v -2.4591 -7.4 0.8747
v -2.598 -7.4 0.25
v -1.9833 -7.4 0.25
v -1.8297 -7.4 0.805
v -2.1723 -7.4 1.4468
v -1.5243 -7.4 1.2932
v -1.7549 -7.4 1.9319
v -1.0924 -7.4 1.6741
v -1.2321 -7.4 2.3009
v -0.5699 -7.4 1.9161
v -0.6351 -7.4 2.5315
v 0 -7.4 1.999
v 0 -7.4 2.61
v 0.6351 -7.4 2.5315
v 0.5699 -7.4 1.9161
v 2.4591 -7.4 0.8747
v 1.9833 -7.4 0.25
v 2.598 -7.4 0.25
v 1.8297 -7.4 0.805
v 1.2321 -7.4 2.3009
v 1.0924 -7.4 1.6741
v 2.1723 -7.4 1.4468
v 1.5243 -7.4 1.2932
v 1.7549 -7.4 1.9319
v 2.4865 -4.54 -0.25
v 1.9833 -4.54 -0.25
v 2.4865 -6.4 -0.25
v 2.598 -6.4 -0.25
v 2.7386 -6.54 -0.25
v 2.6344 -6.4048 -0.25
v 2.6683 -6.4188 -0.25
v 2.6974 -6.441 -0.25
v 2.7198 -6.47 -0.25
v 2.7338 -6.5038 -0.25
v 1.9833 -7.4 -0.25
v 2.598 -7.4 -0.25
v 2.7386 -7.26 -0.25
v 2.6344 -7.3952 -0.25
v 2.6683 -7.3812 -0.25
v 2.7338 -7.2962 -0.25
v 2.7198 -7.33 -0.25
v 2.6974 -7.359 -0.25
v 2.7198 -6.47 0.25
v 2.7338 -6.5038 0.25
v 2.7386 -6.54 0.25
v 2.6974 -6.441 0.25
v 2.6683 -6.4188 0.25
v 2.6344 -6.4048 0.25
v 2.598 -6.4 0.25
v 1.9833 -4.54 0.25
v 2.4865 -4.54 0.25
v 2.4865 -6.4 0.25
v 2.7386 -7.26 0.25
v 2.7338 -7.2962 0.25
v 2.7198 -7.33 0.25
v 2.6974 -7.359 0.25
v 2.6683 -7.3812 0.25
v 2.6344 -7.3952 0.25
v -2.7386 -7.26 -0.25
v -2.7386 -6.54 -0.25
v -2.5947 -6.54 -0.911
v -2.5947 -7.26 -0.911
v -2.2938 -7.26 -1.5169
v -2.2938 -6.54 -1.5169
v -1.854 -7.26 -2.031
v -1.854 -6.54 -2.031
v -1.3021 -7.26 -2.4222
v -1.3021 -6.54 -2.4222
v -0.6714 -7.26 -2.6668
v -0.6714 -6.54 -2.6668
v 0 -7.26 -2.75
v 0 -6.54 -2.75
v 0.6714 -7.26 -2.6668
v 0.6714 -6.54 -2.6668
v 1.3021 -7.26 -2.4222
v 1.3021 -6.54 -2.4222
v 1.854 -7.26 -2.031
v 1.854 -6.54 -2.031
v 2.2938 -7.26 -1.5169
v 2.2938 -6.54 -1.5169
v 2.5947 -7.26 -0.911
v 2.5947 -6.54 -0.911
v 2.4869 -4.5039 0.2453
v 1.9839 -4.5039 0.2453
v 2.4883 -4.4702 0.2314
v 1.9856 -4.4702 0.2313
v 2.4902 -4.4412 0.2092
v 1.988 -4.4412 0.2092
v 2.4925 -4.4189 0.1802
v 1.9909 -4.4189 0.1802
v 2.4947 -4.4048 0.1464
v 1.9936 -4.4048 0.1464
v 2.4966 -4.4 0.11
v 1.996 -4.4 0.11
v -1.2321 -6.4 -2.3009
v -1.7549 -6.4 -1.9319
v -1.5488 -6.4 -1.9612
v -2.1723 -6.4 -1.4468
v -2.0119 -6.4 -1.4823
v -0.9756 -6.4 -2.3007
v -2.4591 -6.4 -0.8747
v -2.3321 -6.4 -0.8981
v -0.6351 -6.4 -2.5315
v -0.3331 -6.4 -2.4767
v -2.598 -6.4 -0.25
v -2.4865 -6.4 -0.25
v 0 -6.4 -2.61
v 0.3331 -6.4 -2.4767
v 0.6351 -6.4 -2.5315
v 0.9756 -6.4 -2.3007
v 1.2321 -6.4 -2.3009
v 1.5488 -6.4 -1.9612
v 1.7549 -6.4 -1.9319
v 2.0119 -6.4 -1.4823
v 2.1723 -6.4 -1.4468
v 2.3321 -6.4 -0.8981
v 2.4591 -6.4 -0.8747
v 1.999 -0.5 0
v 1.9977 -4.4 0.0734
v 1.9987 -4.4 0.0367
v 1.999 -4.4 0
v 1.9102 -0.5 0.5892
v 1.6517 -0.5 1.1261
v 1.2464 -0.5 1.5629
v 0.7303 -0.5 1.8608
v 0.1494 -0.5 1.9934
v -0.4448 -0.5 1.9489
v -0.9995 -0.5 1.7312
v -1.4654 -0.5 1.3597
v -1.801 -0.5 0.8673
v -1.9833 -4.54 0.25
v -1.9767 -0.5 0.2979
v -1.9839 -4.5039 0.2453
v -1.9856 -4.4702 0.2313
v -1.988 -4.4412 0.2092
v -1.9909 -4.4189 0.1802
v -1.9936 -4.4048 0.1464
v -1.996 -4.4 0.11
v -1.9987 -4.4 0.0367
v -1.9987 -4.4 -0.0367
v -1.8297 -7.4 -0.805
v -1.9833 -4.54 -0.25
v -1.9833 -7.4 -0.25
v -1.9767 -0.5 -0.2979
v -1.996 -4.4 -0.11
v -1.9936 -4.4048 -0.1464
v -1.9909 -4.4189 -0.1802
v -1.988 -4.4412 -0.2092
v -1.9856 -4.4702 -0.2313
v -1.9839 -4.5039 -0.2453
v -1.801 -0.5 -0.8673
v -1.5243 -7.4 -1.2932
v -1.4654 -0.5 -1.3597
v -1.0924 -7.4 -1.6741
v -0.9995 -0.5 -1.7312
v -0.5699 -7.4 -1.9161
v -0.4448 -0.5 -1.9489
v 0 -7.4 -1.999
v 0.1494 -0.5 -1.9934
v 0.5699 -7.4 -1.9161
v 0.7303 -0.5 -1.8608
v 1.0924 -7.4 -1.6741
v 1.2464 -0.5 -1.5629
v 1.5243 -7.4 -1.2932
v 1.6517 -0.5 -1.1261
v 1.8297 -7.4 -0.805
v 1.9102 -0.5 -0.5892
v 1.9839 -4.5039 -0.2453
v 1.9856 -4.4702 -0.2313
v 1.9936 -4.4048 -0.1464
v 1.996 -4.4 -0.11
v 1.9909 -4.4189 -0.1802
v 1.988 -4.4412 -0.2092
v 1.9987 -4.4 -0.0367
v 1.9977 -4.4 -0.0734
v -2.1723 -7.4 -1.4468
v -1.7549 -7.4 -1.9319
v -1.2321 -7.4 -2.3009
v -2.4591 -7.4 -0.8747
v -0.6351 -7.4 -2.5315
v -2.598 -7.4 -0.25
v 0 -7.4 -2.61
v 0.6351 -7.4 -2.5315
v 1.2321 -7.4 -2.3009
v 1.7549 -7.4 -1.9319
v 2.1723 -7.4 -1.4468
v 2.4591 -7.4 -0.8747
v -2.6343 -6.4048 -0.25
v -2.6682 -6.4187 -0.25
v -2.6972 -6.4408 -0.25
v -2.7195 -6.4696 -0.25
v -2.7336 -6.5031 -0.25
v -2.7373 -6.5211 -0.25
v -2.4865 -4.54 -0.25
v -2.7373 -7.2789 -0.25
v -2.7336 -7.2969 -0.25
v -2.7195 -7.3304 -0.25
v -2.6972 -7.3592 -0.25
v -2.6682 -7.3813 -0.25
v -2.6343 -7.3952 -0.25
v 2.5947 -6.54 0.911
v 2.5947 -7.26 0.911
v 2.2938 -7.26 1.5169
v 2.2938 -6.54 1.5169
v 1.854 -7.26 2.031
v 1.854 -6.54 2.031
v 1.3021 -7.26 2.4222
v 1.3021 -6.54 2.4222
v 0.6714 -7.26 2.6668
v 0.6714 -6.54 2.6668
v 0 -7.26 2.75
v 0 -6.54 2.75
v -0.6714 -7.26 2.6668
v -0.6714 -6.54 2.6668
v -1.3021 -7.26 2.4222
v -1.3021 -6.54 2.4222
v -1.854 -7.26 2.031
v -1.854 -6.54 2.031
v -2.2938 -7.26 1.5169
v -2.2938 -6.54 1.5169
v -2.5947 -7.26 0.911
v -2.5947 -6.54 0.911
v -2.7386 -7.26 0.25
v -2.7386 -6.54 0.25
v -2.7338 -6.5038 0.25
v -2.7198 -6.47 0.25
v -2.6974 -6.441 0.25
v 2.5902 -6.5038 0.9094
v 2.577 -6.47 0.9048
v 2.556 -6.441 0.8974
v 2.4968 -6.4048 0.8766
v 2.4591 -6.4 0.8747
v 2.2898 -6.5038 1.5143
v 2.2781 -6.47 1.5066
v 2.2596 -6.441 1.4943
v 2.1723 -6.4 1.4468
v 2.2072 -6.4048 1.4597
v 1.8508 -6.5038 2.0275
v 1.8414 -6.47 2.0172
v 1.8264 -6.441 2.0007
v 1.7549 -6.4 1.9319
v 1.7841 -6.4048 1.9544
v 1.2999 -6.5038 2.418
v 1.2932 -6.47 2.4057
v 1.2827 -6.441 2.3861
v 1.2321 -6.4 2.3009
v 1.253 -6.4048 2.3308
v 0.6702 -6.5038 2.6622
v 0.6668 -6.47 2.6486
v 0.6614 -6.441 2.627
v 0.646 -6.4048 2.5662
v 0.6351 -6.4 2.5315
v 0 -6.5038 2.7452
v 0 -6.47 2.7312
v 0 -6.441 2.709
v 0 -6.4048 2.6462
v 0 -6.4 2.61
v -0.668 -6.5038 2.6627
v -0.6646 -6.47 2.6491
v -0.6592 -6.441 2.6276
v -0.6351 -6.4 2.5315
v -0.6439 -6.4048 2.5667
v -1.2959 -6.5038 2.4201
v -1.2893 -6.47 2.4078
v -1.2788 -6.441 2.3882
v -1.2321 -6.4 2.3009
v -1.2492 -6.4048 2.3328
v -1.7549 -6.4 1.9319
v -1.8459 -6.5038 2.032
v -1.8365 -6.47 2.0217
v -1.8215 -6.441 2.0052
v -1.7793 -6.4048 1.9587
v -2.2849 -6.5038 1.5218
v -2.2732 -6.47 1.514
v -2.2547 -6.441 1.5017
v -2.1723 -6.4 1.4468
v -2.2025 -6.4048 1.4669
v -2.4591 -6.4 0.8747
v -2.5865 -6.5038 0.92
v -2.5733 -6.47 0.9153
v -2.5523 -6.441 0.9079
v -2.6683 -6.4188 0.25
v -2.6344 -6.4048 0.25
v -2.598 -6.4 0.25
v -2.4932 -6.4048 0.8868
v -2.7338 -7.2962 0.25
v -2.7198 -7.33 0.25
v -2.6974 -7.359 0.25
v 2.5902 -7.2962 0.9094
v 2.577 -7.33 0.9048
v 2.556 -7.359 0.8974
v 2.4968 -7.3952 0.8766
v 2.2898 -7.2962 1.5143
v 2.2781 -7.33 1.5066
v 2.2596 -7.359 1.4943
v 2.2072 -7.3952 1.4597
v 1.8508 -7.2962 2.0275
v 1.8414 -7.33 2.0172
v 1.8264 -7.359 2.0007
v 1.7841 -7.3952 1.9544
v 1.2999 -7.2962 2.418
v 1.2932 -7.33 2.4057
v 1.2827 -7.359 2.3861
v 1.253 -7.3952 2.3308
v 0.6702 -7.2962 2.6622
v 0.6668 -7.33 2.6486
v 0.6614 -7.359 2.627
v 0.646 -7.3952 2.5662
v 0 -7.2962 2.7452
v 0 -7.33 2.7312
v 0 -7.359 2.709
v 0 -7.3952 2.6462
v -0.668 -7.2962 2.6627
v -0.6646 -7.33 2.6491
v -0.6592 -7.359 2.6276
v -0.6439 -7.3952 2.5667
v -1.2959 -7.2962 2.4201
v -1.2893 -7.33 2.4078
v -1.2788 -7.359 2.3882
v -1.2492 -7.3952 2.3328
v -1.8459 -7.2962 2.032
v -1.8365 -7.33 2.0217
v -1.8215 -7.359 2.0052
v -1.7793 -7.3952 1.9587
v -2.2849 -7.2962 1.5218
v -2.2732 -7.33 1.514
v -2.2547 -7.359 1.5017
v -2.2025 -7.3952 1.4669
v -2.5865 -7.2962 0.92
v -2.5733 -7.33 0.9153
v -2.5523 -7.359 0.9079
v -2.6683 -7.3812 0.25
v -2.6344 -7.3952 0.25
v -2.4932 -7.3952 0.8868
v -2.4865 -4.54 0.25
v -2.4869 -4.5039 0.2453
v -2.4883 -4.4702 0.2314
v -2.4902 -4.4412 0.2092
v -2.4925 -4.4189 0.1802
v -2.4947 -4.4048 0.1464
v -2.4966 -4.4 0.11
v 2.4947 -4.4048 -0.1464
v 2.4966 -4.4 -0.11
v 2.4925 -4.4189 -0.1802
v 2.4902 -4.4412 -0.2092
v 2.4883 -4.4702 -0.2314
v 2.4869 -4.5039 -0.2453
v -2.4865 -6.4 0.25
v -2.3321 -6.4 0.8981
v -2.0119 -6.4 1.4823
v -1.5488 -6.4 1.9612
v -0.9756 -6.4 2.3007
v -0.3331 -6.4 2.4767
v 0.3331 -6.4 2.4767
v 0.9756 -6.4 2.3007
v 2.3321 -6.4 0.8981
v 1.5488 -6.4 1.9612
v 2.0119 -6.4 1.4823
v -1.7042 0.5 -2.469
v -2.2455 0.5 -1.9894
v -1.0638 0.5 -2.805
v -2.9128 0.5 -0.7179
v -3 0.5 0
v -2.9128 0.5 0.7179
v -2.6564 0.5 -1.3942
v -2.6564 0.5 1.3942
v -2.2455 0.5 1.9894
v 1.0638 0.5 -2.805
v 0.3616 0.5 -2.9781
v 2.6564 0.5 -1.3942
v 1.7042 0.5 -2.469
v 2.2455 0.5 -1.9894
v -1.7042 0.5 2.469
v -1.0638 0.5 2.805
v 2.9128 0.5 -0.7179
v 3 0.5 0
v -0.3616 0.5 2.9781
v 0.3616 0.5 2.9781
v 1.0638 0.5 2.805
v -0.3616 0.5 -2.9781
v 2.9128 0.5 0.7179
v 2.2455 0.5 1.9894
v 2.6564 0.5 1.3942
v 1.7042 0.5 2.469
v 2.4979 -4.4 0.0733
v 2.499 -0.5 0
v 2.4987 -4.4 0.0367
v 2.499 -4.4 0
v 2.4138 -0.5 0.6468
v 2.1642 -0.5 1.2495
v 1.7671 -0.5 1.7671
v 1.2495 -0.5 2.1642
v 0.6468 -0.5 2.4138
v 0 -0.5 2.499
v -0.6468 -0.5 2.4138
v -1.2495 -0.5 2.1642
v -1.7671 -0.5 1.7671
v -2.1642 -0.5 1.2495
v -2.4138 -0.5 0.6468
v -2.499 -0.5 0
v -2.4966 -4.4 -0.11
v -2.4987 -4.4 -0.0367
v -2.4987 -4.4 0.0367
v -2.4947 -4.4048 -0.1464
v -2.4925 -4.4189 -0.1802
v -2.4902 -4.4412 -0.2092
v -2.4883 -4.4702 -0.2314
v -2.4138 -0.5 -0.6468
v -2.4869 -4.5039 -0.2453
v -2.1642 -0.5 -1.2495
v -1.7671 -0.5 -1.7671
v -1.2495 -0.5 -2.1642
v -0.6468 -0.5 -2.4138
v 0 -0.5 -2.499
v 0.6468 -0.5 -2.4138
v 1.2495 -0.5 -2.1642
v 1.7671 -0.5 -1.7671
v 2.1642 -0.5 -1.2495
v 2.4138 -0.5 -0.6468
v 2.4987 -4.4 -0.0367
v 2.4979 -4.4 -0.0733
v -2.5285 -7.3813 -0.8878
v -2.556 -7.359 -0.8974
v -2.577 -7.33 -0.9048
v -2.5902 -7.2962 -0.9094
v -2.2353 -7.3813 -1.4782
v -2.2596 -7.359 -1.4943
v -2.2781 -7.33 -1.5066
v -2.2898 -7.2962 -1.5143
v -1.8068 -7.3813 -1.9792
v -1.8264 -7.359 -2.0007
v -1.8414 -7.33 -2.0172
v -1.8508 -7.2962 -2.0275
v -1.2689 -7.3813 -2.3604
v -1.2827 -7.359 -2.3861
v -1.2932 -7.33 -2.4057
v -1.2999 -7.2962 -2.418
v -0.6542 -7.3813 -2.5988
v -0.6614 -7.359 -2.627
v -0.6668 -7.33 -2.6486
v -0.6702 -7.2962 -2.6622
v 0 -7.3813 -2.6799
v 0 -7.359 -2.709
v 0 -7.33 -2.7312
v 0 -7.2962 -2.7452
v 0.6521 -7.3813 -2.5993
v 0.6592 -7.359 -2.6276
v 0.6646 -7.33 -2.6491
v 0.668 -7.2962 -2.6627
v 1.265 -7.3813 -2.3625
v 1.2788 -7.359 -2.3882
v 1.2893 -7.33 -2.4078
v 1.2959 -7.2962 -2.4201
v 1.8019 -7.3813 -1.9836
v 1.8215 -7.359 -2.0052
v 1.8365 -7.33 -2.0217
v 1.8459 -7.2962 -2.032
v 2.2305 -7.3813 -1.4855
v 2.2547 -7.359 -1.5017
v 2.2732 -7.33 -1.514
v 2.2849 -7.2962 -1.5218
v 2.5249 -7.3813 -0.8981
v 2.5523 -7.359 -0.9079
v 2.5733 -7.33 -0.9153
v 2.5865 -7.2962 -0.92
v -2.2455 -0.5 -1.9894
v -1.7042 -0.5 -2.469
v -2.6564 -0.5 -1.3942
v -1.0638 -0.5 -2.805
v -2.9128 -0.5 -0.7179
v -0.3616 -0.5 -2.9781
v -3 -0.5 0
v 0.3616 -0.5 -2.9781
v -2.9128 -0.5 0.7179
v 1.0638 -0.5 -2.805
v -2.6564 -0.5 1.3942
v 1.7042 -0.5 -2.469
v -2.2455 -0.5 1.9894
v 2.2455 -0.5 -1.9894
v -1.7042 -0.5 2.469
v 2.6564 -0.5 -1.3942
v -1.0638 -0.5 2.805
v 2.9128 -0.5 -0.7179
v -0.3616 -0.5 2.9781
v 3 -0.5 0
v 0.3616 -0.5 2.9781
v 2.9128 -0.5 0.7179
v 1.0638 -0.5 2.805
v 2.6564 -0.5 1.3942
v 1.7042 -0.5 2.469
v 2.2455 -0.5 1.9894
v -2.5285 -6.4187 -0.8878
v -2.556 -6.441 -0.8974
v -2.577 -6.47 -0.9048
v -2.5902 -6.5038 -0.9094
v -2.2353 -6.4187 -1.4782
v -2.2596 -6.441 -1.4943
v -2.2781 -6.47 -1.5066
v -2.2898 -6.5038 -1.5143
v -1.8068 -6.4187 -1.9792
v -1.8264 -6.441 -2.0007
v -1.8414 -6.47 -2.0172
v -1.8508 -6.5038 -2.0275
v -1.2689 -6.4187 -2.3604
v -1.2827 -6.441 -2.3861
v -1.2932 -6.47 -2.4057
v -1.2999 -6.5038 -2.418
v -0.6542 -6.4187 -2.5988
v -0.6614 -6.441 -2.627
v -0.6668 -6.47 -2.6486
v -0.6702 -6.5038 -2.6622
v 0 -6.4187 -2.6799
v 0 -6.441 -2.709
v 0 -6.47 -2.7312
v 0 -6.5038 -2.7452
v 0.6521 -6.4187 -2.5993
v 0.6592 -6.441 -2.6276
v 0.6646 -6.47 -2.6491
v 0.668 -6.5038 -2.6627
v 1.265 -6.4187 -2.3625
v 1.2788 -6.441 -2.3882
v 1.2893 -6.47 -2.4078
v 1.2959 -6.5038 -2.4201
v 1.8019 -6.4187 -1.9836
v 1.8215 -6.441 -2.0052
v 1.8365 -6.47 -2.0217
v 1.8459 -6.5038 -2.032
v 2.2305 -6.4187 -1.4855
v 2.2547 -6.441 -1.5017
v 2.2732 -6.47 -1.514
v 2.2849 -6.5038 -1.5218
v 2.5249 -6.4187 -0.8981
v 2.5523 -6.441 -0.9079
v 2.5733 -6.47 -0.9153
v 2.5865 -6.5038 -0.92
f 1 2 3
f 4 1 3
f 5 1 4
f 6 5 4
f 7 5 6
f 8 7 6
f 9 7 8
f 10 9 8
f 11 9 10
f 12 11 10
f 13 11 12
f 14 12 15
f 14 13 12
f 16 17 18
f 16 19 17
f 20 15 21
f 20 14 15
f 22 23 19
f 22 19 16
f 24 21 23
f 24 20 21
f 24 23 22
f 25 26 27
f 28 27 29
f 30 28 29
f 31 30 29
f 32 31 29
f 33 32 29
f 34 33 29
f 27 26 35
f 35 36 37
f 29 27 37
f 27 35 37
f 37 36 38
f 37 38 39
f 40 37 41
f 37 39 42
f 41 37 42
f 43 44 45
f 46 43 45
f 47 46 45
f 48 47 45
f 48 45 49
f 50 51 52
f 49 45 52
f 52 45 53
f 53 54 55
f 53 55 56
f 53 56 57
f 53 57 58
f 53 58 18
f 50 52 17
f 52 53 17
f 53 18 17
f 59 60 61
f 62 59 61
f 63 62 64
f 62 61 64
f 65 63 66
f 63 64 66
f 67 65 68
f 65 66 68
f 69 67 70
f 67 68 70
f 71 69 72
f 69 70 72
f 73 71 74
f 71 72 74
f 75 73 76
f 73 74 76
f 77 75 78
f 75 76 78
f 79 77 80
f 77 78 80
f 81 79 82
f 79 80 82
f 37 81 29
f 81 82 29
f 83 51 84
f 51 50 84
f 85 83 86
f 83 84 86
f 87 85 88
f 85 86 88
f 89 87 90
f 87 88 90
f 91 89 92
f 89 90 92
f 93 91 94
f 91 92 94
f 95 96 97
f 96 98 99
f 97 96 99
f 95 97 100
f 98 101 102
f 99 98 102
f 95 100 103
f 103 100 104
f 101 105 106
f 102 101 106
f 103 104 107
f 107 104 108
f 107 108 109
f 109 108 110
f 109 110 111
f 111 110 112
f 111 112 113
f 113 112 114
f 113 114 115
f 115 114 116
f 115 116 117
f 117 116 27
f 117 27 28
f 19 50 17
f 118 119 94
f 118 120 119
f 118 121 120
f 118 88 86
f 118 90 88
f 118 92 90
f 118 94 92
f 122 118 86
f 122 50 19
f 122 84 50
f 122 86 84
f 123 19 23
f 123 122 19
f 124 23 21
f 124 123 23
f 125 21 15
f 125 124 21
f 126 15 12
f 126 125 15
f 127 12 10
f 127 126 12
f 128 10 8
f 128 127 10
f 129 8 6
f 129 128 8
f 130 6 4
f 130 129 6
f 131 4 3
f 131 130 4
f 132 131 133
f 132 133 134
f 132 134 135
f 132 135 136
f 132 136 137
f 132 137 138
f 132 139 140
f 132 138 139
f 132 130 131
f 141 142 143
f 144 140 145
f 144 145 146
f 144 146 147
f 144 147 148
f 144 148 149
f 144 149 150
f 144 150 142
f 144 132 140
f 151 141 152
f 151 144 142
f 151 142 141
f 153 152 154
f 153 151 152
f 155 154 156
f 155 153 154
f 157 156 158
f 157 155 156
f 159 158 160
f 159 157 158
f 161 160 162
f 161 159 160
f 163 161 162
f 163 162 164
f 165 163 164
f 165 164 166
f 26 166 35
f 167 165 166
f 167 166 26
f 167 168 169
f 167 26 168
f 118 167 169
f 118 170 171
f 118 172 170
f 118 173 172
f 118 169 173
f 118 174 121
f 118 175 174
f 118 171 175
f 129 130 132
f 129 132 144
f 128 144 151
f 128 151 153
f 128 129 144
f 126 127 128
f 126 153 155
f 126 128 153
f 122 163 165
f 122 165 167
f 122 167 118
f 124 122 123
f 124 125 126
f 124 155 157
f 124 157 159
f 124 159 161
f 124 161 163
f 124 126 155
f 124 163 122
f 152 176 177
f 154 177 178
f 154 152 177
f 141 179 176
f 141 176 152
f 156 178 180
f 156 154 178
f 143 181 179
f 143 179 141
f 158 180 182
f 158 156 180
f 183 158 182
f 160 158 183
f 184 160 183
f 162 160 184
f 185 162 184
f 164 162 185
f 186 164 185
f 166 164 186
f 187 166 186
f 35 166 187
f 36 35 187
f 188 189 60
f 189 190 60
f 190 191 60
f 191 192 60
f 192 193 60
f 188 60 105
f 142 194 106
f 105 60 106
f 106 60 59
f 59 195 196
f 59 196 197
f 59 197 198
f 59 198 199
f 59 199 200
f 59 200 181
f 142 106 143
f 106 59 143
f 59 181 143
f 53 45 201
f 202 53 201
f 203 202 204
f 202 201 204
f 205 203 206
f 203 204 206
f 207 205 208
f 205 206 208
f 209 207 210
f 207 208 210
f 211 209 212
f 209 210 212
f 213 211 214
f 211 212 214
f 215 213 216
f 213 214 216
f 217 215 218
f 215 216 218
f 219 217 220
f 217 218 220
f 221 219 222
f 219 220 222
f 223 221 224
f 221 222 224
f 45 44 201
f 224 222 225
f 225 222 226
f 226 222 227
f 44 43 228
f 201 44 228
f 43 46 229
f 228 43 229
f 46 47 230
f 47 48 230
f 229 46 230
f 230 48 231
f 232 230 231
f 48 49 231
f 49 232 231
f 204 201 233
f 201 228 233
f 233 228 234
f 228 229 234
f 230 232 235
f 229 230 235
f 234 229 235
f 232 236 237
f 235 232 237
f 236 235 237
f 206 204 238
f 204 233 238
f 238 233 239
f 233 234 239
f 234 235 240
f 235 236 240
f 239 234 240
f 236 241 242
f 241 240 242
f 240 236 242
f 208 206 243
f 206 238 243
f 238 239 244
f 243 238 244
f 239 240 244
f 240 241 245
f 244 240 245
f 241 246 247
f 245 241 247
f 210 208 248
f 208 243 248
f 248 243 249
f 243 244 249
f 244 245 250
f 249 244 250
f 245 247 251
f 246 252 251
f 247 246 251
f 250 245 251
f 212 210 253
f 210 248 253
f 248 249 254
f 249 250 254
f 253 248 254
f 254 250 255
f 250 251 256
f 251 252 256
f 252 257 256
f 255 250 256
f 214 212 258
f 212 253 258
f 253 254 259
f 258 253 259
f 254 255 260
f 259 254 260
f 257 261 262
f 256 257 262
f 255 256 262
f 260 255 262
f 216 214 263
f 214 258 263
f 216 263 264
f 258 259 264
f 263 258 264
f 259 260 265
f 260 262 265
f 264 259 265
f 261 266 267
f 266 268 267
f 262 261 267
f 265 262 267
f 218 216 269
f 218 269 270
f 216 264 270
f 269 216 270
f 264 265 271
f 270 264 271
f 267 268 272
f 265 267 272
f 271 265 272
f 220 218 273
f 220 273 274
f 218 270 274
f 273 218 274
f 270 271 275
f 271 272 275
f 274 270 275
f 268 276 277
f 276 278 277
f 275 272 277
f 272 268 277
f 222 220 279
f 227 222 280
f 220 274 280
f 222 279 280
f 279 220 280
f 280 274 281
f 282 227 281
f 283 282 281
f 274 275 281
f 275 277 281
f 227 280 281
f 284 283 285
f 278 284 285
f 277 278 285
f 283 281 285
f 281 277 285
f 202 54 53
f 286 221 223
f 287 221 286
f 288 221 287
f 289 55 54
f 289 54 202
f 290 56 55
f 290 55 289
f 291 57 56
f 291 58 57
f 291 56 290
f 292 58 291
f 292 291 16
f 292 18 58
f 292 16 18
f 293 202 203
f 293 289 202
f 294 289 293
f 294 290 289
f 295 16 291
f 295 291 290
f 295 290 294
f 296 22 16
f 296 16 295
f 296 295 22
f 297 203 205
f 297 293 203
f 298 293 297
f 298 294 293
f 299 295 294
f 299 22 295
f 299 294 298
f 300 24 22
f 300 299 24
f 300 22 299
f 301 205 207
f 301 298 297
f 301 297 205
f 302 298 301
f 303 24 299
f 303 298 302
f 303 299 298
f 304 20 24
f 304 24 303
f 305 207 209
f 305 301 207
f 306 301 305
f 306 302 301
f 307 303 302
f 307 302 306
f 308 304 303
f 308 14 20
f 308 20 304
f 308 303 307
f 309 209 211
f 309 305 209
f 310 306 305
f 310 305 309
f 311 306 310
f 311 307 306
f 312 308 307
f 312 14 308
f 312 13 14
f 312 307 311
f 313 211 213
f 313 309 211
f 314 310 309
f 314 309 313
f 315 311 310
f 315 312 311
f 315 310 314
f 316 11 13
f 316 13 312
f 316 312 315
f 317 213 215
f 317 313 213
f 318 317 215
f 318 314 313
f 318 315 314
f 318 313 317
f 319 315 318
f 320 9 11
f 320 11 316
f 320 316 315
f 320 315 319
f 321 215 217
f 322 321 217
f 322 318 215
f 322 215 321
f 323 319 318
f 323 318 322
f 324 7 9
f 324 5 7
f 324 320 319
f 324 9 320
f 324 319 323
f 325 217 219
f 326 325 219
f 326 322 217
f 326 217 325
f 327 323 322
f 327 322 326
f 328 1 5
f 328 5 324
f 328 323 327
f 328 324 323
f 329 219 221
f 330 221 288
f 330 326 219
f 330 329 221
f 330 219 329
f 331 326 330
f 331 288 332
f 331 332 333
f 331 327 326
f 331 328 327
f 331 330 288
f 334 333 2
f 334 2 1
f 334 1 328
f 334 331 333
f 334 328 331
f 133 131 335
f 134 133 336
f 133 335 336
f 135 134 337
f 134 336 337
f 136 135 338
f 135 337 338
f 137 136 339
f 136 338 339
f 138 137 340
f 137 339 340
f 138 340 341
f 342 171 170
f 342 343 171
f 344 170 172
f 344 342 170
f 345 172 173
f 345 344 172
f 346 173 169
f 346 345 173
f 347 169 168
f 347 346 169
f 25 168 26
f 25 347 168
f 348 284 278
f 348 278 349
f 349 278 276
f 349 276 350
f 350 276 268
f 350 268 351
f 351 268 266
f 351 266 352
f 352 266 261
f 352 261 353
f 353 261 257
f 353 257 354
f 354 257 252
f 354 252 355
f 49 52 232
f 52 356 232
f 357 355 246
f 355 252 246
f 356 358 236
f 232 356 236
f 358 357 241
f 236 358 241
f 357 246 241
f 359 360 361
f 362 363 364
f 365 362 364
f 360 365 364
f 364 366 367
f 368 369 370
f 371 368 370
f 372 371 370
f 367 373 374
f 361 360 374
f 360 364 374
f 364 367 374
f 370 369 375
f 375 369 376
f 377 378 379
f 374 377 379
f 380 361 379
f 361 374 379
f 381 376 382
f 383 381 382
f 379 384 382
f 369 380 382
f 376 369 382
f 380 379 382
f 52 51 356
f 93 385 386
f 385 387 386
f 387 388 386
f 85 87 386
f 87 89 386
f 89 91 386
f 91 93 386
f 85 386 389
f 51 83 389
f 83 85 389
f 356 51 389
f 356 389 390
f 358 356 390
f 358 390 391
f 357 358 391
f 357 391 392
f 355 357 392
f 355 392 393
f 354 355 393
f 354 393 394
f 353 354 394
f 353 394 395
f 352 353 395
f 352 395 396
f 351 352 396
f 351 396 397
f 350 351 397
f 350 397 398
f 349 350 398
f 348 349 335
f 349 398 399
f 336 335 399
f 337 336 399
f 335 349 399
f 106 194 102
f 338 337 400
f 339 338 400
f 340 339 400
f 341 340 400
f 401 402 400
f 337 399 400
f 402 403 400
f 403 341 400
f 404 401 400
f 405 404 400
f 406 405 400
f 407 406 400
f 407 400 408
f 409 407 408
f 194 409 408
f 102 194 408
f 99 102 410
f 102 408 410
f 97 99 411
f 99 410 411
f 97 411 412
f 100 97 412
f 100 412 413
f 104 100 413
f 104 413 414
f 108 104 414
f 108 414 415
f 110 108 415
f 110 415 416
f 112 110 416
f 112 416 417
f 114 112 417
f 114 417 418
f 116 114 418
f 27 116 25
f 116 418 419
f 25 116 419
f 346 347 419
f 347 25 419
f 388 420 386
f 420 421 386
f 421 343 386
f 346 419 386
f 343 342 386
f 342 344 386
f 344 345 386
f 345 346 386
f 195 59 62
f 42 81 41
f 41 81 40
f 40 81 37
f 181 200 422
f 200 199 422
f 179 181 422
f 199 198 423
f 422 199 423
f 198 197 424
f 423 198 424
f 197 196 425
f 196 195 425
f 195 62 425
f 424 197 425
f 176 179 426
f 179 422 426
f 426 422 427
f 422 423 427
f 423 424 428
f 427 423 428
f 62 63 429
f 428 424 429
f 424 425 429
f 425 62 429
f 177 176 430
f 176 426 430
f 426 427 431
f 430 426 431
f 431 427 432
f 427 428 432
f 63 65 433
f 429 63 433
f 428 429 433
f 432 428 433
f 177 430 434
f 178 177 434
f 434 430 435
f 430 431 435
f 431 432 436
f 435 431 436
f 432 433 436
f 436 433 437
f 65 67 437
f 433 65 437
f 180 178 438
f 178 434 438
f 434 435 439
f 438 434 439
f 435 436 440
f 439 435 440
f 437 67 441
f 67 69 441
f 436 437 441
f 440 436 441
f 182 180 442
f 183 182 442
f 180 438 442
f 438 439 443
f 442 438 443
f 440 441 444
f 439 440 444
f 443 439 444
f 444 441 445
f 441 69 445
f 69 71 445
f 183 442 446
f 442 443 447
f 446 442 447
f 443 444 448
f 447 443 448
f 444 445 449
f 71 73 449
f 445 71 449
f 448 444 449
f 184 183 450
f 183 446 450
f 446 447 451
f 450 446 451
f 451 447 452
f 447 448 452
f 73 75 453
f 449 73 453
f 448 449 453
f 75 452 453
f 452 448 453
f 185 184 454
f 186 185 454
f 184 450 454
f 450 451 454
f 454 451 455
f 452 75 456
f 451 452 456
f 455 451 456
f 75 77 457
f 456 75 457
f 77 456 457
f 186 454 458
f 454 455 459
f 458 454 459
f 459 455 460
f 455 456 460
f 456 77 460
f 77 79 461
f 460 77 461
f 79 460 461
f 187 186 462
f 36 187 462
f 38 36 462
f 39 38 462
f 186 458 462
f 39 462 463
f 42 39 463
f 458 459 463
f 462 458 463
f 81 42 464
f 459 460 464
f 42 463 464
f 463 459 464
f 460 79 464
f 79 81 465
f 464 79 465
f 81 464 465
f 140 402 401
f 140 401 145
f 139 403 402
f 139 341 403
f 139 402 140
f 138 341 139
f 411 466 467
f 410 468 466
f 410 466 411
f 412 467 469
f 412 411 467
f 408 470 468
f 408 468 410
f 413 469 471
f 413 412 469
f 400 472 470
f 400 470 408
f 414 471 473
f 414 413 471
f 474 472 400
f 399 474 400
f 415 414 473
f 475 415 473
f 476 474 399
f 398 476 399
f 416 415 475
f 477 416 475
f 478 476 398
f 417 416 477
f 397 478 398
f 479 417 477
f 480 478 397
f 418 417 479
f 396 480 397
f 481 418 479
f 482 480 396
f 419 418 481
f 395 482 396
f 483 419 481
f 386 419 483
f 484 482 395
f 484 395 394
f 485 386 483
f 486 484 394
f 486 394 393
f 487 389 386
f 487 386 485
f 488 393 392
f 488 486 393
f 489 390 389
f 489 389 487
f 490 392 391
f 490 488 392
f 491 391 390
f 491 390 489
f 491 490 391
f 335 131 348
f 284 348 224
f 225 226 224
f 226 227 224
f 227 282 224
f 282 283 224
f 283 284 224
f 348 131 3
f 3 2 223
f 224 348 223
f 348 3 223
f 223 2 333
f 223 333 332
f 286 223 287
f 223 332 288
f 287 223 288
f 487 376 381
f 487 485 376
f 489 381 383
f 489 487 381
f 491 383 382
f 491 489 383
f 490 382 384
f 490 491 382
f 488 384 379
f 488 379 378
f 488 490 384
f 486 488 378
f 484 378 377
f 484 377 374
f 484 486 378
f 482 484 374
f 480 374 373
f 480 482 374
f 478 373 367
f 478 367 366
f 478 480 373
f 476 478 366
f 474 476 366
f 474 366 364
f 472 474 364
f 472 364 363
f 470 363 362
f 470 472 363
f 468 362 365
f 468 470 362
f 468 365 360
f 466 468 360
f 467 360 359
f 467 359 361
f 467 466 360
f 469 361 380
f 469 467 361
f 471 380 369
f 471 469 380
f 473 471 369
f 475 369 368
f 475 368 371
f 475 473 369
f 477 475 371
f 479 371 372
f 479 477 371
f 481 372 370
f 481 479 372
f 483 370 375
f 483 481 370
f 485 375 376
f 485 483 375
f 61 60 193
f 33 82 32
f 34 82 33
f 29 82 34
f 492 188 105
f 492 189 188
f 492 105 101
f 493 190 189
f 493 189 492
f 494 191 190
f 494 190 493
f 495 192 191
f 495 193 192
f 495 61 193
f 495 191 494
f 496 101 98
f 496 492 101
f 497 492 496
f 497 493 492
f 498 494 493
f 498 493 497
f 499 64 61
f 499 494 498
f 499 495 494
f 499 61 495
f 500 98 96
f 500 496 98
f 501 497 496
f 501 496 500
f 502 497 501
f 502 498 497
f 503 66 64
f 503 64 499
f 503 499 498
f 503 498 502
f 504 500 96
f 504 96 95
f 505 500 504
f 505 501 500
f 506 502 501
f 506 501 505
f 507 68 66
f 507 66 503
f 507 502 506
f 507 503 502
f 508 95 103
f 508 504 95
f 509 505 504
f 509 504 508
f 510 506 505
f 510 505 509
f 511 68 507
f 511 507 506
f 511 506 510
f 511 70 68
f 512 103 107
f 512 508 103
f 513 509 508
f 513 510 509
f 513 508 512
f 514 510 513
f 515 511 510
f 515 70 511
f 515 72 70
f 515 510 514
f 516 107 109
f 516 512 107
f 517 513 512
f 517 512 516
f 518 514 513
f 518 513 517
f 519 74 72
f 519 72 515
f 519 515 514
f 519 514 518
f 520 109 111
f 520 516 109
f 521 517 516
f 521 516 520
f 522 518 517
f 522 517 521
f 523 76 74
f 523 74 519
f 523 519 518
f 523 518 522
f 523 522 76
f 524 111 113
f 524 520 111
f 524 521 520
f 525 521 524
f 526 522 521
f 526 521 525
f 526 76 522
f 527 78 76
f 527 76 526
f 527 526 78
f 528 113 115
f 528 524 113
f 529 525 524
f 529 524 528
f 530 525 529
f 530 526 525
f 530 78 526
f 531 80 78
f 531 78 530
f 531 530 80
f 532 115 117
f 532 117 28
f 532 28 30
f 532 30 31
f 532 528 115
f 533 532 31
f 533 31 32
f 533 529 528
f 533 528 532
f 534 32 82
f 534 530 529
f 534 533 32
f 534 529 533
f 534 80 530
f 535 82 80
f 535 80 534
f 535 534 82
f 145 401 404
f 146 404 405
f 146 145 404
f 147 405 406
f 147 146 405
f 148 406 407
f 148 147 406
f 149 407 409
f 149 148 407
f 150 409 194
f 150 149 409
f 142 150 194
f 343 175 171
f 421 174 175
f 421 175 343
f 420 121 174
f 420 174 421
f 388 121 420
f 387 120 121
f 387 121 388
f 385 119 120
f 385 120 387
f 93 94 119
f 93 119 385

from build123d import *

# Parameters (mm, degrees)
F0_R     = 3
F1_DEPTH = 0.5
F2_R     = 2.499
F2_R_2   = 1.999
F3_DEPTH = 5.9
F4_R     = 2.75
F4_R_2   = 1.999
F5_DEPTH = 1
F7_DEPTH = 3
F8_R     = 0.14


with BuildPart() as f1:
    # F0 (on Front) → F1 (new body, symmetric)
    with BuildSketch(Plane.XZ):
        Circle(F0_R)
    extrude(amount=F1_DEPTH, both=True)

    # F2 (on face) → F3 (join)
    with BuildSketch(Plane.XZ.offset(0.5)):
        Circle(F2_R)
        Circle(F2_R_2, mode=Mode.SUBTRACT)
    extrude(amount=F3_DEPTH)

    # F4 (on face) → F5 (join)
    with BuildSketch(Plane.XZ.offset(6.4)):
        Circle(F4_R)
        Circle(F4_R_2, mode=Mode.SUBTRACT)
    extrude(amount=F5_DEPTH)

    # F6 (on face) → F7 (cut)
    with BuildSketch(Plane.XZ.offset(7.4)):
        with BuildLine():
            ThreePointArc((2.7386127875, -0.25), (2.75, 0), (2.7386127875, 0.25))
            Line((2.7386127875, 0.25), (1.983305574, 0.25))
            ThreePointArc((1.983305574, 0.25), (1.999, 0), (1.983305574, -0.25))
            Line((1.983305574, -0.25), (2.7386127875, -0.25))
        make_face()
        with BuildLine():
            Line((-2.7386127875, -0.25), (-1.983305574, -0.25))
            ThreePointArc((-1.983305574, -0.25), (-1.999, 0), (-1.983305574, 0.25))
            Line((-1.983305574, 0.25), (-2.7386127875, 0.25))
            ThreePointArc((-2.7386127875, 0.25), (-2.75, 0), (-2.7386127875, -0.25))
        make_face()
    extrude(amount=-F7_DEPTH, mode=Mode.SUBTRACT)

    # F8
    f8_edges = [f1.edges().sort_by_distance(p)[0] for p in [
        (-2.234885, -4.4, -0.25),
        (0, -6.4, 2.75),
        (0, -7.4, 2.75),
        (0, -7.4, -2.75),
        (0, -6.4, -2.75),
        (2.234885, -4.4, -0.25),
        (2.234885, -4.4, 0.25),
        (-2.234885, -4.4, 0.25),
    ]]
    fillet(f8_edges, radius=F8_R)


solid = f1.part
